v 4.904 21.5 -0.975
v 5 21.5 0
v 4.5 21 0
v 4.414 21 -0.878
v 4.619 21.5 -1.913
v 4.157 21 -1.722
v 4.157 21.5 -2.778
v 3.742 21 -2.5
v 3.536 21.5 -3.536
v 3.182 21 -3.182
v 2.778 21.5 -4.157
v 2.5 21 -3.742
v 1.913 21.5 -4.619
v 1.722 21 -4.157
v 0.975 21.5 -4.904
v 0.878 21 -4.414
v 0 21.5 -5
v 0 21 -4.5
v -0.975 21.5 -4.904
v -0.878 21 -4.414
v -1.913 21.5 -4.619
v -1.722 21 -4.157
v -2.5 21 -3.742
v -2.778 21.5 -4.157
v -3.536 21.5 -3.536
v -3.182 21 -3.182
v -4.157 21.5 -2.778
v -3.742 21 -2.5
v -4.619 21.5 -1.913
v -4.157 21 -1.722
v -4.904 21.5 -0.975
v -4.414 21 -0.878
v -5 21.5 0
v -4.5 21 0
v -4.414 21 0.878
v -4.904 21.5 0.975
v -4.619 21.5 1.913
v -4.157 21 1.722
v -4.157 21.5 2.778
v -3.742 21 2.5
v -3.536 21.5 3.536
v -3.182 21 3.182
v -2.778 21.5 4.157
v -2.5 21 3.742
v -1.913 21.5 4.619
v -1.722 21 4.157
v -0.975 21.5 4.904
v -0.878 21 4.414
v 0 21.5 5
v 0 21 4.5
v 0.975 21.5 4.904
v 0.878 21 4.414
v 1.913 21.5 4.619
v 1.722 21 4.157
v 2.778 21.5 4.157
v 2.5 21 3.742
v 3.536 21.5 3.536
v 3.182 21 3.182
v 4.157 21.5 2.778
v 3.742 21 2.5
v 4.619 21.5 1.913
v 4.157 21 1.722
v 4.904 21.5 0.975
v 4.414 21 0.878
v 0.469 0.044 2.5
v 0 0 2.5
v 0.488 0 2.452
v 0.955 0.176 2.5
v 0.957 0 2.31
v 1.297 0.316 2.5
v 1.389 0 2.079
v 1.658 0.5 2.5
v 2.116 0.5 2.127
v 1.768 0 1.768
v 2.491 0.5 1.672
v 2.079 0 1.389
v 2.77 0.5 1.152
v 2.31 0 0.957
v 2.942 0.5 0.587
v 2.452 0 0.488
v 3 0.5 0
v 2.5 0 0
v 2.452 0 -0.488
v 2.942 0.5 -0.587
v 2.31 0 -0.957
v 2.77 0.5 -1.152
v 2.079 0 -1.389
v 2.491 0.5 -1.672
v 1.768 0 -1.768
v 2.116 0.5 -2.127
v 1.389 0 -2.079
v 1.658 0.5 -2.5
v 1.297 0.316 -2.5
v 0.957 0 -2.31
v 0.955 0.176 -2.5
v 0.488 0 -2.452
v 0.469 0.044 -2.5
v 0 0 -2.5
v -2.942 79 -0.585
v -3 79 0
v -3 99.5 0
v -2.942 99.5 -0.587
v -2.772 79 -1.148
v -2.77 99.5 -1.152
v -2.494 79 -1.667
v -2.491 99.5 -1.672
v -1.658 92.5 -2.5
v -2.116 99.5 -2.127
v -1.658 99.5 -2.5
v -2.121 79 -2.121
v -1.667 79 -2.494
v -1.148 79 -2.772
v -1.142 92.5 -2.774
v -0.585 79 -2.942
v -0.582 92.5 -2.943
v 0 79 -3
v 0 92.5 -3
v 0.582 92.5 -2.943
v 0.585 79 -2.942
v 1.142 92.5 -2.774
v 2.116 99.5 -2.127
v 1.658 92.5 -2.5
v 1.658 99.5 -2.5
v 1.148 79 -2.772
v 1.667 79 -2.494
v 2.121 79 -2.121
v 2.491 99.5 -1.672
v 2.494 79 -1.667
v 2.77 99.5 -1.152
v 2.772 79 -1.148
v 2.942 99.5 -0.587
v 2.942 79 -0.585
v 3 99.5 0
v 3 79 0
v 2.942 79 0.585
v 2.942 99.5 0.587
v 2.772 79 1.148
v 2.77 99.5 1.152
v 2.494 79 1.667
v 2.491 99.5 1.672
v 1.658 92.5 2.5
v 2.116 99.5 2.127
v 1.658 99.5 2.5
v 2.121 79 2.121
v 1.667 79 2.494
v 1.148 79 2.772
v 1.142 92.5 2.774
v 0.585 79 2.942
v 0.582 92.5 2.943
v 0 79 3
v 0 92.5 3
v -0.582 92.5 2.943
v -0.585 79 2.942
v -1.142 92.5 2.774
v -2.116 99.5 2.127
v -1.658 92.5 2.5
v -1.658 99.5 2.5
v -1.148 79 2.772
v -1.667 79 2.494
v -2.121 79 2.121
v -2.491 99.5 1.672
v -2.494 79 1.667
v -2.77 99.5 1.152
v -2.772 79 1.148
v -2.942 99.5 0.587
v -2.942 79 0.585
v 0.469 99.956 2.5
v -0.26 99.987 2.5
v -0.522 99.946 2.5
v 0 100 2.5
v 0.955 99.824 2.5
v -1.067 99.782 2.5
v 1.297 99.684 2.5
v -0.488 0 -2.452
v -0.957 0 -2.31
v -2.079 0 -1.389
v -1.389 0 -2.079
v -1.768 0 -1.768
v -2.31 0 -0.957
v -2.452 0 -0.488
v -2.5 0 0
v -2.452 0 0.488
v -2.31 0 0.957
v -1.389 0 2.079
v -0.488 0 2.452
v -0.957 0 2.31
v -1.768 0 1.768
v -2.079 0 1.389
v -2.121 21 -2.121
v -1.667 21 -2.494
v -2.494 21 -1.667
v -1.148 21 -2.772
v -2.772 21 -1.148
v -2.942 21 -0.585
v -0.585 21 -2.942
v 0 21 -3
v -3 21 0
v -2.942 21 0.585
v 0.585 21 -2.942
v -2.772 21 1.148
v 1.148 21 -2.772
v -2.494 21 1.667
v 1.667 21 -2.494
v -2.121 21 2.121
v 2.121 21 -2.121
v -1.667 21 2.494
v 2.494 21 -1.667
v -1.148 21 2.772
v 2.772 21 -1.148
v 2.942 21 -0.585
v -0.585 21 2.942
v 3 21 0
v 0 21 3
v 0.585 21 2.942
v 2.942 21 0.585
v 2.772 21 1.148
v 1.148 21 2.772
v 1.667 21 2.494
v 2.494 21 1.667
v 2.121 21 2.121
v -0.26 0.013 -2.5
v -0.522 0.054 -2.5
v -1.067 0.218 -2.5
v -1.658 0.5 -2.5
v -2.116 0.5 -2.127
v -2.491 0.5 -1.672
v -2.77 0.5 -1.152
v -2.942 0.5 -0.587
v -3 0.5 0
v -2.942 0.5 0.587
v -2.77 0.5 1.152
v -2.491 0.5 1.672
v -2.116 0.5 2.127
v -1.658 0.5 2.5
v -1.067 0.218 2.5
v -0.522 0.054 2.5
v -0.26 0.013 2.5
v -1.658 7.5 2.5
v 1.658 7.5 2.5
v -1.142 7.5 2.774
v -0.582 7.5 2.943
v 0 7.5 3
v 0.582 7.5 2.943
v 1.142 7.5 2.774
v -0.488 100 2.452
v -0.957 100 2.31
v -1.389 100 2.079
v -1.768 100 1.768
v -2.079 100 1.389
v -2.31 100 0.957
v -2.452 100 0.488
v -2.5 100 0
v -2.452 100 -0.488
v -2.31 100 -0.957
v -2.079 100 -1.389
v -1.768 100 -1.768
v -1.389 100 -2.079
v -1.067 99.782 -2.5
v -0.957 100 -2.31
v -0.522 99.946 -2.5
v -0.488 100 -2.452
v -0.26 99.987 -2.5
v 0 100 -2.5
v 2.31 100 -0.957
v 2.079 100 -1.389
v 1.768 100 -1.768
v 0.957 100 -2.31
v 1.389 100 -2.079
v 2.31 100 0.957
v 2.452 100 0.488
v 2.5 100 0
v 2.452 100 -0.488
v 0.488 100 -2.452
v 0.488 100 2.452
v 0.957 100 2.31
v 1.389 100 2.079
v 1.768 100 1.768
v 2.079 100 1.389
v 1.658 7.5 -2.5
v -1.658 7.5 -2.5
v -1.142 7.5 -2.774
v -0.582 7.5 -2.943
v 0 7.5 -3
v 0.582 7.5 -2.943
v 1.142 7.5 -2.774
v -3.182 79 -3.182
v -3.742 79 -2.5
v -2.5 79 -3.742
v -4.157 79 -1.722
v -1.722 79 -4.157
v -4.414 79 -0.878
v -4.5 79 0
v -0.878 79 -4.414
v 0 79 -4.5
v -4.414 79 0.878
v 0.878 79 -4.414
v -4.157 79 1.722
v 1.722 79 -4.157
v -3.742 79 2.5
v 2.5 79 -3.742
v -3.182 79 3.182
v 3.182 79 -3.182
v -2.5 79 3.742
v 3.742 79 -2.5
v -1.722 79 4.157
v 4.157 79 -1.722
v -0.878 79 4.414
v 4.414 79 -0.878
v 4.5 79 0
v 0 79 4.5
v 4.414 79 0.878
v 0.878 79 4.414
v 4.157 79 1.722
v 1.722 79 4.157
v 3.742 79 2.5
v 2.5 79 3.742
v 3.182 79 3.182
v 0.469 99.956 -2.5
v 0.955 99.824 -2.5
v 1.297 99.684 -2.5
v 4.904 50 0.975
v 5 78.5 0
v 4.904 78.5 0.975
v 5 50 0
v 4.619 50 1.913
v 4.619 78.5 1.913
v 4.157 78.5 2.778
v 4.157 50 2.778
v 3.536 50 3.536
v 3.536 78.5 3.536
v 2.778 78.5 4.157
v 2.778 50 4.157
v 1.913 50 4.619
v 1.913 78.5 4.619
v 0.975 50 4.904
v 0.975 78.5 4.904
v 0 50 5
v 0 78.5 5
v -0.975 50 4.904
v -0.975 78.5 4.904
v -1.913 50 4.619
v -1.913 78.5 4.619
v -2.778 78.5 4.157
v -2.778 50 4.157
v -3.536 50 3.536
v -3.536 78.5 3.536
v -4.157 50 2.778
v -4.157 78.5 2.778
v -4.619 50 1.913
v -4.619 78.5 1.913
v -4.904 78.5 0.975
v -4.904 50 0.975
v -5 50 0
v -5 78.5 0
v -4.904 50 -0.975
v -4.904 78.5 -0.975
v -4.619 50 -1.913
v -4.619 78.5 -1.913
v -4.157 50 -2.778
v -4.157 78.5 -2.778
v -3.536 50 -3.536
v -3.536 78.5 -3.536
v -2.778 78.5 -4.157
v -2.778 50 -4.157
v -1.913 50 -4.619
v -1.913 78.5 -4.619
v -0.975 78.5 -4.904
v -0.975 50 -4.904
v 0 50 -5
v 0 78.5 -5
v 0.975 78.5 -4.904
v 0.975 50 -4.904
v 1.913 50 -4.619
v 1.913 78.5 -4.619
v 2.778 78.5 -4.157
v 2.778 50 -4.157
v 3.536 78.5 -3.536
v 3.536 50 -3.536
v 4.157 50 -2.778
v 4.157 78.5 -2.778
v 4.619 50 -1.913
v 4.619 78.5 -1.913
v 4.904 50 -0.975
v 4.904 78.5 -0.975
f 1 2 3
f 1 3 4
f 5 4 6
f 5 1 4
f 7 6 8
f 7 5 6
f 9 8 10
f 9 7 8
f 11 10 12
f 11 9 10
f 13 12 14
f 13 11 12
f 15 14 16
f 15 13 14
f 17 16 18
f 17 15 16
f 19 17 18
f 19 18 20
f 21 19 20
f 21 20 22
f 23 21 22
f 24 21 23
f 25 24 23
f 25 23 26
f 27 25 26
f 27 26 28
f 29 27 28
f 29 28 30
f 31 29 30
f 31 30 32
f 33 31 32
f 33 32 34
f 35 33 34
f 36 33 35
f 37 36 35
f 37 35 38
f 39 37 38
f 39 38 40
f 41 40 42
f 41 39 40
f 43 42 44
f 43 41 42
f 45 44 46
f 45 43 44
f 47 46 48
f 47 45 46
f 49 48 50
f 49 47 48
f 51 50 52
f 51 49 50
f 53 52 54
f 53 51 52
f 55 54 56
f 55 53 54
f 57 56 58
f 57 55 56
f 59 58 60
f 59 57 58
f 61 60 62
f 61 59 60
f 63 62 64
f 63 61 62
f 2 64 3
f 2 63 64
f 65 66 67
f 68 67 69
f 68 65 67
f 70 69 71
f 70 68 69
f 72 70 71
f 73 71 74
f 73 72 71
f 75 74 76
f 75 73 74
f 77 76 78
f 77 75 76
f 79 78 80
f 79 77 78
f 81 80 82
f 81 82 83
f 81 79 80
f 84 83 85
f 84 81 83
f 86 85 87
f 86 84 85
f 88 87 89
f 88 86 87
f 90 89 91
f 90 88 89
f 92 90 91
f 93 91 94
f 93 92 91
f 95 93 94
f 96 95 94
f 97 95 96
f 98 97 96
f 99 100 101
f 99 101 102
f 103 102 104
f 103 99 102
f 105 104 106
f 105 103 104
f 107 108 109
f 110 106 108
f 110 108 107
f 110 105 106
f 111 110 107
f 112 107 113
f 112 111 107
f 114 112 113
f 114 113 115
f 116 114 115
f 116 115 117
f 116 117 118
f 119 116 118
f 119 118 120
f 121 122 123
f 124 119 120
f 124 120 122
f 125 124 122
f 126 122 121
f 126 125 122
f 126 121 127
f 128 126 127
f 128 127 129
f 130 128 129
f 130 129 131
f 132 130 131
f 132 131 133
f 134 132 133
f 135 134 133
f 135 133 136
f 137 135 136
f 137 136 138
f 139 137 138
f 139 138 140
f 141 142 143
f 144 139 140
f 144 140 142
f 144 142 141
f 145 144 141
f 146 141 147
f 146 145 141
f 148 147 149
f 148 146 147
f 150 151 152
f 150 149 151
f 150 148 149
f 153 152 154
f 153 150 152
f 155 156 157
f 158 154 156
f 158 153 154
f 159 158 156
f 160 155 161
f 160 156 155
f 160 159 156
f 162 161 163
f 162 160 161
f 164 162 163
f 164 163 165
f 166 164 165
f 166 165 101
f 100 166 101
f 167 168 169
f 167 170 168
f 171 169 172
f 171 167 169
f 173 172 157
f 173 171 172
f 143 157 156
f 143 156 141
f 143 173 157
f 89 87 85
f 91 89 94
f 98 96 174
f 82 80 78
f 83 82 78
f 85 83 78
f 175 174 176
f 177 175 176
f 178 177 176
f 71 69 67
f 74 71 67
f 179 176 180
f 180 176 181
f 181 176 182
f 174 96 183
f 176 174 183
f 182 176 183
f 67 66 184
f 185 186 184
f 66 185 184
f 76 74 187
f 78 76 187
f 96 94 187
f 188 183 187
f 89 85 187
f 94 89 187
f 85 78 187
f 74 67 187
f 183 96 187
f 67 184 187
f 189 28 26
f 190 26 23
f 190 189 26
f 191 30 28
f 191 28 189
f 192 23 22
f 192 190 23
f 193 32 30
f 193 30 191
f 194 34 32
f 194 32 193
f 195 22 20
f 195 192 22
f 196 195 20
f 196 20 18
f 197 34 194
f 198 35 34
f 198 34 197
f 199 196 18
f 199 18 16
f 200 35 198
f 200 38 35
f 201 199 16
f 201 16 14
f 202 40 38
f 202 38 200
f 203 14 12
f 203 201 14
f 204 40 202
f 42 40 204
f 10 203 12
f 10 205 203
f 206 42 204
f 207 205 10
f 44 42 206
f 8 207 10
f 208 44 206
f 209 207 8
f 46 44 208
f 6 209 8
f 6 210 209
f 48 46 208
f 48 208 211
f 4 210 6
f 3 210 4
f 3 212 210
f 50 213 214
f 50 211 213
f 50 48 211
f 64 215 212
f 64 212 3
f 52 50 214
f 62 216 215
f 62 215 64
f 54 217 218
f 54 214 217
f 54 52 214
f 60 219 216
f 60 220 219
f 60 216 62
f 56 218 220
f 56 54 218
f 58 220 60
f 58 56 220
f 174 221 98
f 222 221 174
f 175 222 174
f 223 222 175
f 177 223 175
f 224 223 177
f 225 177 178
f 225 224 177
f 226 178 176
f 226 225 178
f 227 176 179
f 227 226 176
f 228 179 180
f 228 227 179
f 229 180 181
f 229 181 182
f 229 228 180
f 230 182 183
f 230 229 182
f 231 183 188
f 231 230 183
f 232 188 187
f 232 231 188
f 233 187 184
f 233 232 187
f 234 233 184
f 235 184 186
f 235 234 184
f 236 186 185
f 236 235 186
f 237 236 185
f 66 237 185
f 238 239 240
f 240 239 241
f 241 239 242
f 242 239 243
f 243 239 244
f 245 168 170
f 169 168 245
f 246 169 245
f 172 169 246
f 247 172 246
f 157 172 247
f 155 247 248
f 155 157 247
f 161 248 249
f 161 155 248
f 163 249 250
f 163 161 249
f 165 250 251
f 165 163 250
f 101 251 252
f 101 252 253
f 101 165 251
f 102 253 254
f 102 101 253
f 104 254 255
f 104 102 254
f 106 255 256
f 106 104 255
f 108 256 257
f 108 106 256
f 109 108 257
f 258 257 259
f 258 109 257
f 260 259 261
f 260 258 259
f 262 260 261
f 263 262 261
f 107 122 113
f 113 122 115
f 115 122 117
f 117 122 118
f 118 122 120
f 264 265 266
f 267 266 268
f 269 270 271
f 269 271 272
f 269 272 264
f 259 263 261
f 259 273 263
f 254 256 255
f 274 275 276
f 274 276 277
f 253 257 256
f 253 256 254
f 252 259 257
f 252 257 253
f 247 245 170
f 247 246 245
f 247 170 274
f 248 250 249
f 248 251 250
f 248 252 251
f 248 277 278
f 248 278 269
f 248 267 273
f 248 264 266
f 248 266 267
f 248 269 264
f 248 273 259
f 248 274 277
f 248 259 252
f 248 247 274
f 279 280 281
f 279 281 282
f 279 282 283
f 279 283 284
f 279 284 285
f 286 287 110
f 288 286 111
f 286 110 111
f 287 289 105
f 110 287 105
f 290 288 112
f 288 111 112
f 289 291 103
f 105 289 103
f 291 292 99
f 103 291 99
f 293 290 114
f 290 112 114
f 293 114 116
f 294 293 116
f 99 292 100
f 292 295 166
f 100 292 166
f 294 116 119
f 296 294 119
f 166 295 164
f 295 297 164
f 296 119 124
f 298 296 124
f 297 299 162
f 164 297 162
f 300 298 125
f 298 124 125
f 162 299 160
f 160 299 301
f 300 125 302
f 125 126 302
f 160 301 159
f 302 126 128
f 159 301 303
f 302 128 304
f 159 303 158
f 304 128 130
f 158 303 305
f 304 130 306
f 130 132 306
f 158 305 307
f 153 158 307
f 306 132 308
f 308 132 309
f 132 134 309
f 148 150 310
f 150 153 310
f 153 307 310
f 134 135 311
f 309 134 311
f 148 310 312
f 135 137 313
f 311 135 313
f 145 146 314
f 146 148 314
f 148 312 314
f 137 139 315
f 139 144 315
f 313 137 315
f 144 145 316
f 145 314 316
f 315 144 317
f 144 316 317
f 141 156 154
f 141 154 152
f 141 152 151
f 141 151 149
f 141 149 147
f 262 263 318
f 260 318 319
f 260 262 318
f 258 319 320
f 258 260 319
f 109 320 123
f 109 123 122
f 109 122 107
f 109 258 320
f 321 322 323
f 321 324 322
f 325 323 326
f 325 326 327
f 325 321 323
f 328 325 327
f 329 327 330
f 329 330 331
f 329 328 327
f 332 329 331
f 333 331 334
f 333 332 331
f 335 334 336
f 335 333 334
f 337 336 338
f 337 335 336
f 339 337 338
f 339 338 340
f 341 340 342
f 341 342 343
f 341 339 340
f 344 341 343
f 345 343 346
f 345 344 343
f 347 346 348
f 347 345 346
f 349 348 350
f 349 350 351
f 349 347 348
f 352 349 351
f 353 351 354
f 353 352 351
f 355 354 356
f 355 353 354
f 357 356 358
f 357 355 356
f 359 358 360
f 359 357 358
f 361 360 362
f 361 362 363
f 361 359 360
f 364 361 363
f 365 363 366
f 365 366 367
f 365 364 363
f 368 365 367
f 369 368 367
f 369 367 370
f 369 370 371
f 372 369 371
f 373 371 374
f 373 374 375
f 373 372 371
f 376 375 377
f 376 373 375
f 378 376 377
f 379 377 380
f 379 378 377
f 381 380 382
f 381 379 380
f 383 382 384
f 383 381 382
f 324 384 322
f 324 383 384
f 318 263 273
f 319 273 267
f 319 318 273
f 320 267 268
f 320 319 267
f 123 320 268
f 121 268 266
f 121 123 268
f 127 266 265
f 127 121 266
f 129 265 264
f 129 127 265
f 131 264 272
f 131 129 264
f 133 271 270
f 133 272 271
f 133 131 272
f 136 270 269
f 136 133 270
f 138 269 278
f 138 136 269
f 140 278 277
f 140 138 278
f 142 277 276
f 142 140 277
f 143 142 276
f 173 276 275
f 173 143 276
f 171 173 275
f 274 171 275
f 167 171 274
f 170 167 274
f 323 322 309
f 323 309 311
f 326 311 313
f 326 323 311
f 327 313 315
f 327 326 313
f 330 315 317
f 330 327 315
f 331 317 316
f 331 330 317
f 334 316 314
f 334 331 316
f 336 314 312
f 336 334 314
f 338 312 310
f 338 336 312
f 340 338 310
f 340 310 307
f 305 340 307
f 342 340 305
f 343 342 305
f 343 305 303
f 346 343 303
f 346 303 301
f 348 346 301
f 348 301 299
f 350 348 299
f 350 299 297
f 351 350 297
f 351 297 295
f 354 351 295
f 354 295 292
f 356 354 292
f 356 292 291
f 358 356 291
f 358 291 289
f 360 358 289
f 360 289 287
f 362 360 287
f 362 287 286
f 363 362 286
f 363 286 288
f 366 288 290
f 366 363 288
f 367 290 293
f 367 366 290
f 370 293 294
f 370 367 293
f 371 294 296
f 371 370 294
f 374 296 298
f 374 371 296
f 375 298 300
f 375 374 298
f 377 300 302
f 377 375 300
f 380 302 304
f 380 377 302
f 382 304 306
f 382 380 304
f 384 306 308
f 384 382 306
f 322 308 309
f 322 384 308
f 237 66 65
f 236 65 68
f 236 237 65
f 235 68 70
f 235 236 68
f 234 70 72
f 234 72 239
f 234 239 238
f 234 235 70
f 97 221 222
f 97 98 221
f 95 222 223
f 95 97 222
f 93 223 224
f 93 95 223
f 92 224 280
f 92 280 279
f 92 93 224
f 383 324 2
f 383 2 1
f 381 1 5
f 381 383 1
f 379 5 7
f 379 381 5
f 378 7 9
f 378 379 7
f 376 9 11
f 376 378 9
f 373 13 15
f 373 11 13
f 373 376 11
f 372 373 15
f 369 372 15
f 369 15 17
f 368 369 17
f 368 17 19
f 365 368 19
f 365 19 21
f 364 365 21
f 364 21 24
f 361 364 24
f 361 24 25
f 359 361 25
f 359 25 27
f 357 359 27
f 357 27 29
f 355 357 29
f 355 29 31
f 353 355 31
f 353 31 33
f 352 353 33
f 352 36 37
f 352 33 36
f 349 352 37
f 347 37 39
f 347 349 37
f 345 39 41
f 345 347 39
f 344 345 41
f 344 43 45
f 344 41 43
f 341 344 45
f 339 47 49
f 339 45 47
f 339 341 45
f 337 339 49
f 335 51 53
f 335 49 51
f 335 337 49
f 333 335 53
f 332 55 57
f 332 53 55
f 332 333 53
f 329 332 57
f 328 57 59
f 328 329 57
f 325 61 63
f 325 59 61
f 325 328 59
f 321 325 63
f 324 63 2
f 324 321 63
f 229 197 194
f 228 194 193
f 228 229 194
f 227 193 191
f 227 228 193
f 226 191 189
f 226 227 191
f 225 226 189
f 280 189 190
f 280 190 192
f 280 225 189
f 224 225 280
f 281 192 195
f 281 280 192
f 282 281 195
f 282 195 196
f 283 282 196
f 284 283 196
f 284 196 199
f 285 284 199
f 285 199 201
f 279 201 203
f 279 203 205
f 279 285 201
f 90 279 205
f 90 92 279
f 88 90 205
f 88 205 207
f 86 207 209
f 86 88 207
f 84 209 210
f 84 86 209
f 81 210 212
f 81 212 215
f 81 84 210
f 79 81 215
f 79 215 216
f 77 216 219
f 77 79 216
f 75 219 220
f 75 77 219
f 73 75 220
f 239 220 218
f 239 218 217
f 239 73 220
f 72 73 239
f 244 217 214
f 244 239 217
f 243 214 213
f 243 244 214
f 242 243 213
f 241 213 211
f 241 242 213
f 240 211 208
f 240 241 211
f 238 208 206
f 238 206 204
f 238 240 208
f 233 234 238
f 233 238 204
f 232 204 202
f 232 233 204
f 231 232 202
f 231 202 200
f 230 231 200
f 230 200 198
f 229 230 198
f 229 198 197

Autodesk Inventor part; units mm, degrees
ref_plane "YZ Plane" through (0, 0, 0) normal (1, 0, 0) x (0, 1, 0)
ref_plane "XZ Plane" through (0, 0, 0) normal (0, 1, 0) x (-1, 0, 0)
ref_plane "XY Plane" through (0, 0, 0) normal (0, 0, 1) x (1, 0, 0)
sketch "Sketch1" plane through (0, 0, 0) normal (0, 1, 0) x (-1, 0, 0)
  circle A0 centre (0, 0) radius 3
  dimension "d0" = 6
extrude "Extrusion1" add sketch "Sketch1" along normal blind 100
chamfer "Chamfer1" distance 0.5 angle 45 2 edges at (3, 100, 0) (3, 0, 0)
sketch "Sketch3" plane through (0, 100, 0) normal (0, 1, 0) x (1, 0, 0)
  circle A0 centre (0, 0) radius 3 projected
  line L0 (-1.6583, -2.5) -> (1.6583, -2.5)
  dimension "d16" = 2.5
extrude "Extrusion3" cut sketch "Sketch3" against normal blind 7.5 contours L0 A0 picked at (-0.3442, -2.6056)
mirror "Mirror1" about plane through (0, 0, 0) normal (0, 0, 1) of "Extrusion3"
ref_plane "Work Plane3" through (0, 50, 0) normal (0, -1, 0) x (1, 0, 0)
mirror "Mirror2" about plane through (0, 50, 0) normal (0, -1, 0) of "Extrusion3", "Mirror1"
sketch "Sketch4" plane through (0, 50, 0) normal (0, -1, 0) x (1, 0, 0)
  circle A0 centre (0, 0) radius 5
  dimension "d20" = 10
extrude "Extrusion4" add sketch "Sketch4" along normal mid plane 58
chamfer "Chamfer3" distance 0.5 angle 45 2 edges at (-5, 21, 0) (-5, 79, 0)
thread "Thread3" size "M10x1.5" class "6g" standard "ANSI Metric M Profile" full length
properties part number "Вал"
